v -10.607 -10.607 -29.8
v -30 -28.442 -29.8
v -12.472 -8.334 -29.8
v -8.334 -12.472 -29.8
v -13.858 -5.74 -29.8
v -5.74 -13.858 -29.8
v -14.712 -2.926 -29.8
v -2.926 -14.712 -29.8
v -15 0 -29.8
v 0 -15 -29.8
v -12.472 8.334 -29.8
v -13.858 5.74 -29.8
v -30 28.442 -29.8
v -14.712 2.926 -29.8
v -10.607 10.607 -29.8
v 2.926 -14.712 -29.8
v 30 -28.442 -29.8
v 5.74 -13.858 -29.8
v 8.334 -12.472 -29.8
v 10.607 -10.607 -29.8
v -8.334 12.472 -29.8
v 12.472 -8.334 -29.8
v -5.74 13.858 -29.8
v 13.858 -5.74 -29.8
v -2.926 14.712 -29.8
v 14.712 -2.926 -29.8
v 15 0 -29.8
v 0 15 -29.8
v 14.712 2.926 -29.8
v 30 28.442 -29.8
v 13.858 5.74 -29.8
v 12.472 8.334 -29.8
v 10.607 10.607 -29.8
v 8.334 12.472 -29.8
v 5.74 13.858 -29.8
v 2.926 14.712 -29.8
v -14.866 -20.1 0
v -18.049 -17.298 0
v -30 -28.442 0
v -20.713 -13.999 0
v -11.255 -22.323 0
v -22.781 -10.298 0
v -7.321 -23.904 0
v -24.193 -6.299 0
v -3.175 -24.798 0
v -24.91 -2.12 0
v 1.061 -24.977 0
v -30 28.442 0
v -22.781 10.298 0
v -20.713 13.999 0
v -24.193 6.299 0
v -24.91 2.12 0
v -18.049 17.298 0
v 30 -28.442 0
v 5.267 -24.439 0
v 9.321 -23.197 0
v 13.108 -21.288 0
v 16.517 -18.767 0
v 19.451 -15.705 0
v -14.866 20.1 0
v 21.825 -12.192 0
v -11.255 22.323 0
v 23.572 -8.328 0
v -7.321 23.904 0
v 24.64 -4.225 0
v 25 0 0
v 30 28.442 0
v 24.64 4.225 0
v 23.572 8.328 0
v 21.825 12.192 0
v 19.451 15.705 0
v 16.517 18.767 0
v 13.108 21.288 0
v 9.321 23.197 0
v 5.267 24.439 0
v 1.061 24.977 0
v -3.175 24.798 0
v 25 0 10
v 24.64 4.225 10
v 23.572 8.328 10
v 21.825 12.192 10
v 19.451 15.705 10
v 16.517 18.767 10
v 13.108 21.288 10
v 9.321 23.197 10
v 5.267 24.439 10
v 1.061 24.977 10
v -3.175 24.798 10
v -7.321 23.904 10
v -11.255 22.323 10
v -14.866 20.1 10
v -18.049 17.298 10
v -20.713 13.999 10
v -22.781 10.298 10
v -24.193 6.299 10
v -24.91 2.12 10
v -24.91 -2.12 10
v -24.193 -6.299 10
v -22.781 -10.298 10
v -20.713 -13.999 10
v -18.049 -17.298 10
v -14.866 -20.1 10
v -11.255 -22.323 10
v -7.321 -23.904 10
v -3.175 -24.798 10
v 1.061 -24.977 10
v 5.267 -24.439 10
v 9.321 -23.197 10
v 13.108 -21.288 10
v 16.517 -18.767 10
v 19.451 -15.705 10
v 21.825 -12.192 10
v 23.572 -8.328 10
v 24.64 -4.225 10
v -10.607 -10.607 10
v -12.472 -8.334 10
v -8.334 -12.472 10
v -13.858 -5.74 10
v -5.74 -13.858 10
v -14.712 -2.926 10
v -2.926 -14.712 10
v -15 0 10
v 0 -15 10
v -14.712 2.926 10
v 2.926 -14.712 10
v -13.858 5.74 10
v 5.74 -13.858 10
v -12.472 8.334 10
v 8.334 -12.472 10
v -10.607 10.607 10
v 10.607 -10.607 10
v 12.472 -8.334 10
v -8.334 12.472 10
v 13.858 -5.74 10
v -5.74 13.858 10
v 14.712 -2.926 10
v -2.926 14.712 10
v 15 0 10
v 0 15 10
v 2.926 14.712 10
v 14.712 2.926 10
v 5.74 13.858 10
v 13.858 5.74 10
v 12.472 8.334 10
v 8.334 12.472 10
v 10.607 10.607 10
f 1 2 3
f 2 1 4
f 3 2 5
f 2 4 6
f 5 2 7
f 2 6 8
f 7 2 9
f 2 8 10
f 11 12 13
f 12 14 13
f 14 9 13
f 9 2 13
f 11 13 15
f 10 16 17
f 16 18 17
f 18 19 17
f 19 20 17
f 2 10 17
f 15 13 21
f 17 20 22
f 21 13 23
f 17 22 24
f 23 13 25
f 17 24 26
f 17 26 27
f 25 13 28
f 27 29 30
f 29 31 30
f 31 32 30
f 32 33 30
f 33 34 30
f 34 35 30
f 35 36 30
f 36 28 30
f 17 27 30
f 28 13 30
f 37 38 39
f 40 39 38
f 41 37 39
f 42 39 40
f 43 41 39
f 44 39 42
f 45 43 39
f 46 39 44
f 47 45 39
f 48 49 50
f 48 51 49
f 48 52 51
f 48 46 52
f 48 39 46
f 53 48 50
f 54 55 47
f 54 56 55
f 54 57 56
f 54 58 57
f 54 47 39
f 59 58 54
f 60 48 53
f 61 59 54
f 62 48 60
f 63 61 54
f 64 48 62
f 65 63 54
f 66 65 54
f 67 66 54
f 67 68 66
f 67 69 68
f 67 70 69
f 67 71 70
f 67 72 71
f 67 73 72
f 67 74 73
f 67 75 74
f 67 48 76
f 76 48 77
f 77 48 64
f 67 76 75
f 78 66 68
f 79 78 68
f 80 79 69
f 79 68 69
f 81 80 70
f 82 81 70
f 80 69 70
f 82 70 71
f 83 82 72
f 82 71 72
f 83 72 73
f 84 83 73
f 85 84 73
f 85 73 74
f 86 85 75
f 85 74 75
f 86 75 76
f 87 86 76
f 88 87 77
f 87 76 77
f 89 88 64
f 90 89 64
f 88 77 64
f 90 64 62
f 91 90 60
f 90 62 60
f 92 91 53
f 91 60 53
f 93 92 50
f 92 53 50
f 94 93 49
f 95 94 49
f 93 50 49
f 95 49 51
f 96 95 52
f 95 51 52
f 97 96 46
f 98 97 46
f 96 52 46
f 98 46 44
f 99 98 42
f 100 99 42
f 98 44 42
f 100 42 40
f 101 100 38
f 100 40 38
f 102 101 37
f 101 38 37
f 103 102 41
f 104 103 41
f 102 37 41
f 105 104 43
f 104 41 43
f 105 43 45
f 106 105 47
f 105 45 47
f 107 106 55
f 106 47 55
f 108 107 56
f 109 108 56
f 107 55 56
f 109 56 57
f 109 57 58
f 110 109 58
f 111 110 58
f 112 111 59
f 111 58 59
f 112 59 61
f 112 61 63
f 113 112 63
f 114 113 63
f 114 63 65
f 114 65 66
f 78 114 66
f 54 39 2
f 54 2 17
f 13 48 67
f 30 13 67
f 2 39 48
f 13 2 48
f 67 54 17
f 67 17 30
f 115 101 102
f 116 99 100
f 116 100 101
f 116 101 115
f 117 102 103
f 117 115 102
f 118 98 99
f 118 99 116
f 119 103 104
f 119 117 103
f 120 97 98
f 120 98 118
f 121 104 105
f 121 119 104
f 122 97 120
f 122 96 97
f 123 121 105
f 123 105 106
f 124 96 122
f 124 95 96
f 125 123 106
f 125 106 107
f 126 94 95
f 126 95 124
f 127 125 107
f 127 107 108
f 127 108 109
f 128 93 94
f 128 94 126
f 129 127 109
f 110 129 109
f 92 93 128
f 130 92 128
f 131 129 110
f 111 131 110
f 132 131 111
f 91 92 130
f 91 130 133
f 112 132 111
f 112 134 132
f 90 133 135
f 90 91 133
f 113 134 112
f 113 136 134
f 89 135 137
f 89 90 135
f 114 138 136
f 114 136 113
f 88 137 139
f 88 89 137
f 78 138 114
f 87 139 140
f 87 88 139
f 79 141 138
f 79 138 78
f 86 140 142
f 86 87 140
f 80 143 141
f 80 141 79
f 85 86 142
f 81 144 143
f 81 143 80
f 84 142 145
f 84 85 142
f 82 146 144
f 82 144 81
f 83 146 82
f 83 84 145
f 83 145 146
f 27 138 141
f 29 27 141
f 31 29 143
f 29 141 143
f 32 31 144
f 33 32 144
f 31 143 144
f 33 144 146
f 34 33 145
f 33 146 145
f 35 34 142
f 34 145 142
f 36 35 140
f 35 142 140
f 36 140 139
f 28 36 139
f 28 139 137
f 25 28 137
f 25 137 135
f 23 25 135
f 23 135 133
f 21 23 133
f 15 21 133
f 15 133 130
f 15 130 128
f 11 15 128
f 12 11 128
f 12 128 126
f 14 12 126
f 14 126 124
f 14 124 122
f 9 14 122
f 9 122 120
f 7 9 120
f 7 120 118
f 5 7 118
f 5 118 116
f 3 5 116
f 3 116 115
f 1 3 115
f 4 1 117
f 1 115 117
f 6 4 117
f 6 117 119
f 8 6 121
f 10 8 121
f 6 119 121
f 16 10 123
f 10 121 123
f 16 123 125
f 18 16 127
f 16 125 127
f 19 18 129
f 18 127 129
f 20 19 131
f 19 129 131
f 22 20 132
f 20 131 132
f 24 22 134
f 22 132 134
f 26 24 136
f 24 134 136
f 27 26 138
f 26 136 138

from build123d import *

# Parameters (mm, degrees)
F0_R      = 25
F1_DEPTH  = 10
F2_W      = 60
F2_H      = 56.883122
F1_FACE_R = 25
F3_DEPTH  = 29.8
F4_R      = 15
F5_DEPTH  = 47.7


with BuildPart() as f1:
    # F0 (on Top) → F1 (new body)
    with BuildSketch(Plane.XY):
        Circle(F0_R)
    extrude(amount=F1_DEPTH)

    # F2 (on Top) + F1_face (on face) → F3 (join)
    with BuildSketch(Plane.XY):
        Rectangle(F2_W, F2_H)
    with BuildSketch(Plane.XY.offset(10)):
        Circle(F1_FACE_R)
    extrude(amount=-F3_DEPTH)

    # F4 (on face) → F5 (cut)
    with BuildSketch(Plane.XY.offset(10)):
        Circle(F4_R)
    extrude(amount=-F5_DEPTH, mode=Mode.SUBTRACT)


solid = f1.part
